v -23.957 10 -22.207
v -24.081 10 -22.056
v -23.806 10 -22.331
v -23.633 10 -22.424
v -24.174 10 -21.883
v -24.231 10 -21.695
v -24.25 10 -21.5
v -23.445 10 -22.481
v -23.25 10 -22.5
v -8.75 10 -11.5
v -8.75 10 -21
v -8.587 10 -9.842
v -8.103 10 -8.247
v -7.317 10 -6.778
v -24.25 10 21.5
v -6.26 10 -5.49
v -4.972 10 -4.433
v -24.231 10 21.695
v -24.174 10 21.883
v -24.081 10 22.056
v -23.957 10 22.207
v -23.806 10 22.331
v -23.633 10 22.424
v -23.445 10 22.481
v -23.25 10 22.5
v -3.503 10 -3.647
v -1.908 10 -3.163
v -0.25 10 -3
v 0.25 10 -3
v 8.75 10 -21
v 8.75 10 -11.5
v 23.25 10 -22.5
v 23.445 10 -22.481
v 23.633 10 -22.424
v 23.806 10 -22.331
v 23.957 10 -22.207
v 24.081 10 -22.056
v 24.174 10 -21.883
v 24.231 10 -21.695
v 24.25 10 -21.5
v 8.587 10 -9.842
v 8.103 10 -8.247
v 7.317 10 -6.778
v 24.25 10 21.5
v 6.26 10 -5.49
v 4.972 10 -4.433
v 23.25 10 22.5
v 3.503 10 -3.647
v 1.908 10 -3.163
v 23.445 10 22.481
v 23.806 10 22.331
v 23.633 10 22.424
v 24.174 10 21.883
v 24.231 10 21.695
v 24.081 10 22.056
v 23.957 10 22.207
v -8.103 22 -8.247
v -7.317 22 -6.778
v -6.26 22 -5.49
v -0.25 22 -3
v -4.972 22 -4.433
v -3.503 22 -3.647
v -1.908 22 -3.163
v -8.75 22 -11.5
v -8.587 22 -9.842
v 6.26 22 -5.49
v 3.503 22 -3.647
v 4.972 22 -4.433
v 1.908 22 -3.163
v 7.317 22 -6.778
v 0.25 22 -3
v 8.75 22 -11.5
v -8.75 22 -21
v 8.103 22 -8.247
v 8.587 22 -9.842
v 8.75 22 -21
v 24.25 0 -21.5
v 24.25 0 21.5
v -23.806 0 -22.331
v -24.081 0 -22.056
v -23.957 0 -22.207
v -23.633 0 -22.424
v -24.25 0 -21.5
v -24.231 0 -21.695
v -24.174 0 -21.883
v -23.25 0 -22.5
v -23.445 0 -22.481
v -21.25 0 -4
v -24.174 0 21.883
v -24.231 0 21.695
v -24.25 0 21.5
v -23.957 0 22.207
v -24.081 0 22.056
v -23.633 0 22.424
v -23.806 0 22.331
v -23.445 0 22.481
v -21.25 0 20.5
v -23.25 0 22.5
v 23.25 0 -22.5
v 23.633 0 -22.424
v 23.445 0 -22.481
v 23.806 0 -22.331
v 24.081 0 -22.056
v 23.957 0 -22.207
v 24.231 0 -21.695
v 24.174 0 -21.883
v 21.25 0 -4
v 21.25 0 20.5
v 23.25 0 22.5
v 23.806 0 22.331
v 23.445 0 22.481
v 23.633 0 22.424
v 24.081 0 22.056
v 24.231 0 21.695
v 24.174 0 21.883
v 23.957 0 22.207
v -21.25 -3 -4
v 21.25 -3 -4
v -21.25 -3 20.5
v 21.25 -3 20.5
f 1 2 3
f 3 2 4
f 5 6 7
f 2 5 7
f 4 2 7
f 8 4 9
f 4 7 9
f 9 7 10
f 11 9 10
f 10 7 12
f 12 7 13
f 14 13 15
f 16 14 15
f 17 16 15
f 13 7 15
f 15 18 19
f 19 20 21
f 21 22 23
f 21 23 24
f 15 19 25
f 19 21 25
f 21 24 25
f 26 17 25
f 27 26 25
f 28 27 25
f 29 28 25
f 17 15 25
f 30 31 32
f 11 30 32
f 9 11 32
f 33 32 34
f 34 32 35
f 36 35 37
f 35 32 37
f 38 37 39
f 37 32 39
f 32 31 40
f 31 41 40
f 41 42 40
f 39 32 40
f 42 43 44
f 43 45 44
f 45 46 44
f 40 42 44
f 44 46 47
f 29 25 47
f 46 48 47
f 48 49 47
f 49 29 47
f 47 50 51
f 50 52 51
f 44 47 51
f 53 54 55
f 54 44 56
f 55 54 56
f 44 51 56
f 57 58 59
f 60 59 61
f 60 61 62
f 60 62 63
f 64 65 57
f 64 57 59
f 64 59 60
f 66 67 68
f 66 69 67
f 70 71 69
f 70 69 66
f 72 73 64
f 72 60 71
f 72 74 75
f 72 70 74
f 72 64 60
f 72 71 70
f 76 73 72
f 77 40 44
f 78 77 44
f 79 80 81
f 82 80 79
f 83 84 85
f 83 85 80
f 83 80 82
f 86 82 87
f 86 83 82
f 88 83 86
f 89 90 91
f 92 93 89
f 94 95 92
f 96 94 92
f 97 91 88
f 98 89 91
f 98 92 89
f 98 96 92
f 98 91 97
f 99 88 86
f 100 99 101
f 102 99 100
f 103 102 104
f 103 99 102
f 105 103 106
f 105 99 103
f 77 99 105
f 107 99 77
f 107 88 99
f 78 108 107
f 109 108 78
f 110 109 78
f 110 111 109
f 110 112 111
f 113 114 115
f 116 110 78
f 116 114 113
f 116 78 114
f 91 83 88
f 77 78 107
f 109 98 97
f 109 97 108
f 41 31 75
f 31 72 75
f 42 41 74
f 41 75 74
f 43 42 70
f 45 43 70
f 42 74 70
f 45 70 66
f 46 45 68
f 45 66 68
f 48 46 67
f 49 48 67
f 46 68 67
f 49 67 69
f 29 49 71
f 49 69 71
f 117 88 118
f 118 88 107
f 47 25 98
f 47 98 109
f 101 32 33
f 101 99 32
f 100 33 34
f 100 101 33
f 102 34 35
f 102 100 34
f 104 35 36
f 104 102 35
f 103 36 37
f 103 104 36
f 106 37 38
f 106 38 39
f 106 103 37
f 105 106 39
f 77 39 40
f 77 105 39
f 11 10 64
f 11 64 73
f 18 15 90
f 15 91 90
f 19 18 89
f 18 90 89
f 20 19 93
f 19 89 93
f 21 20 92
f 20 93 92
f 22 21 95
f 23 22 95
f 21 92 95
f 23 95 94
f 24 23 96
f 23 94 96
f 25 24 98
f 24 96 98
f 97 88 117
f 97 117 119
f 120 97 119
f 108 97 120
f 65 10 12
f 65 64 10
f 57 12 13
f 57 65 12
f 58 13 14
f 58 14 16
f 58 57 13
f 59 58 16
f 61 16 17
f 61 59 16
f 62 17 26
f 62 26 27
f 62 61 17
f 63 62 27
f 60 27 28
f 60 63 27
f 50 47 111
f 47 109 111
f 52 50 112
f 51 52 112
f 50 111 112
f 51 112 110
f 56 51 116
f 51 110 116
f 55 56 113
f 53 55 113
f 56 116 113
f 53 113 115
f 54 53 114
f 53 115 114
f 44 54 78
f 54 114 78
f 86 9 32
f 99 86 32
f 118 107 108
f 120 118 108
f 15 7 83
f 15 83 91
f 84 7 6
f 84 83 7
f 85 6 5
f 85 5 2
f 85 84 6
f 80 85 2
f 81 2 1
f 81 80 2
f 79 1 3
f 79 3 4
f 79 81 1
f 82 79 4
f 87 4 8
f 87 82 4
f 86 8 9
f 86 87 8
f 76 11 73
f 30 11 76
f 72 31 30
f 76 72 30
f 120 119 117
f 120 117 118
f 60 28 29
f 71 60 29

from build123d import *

# Parameters (mm, degrees)
SKETCH002_W  = 48.5
SKETCH002_H  = 45
PAD_DEPTH    = 10
SKETCH003_W  = 42.5
SKETCH003_H  = 24.5
PAD002_DEPTH = 3
SKETCH004_W  = 17.5
SKETCH004_H  = 18
PAD003_DEPTH = 12
FILLET_R     = 1
FILLET001_R  = 8.5


with BuildPart() as part:
    # Sketch002 → Pad (new body)
    with BuildSketch(Plane.XZ):
        Rectangle(SKETCH002_W, SKETCH002_H)
    extrude(amount=PAD_DEPTH)

    # Sketch003 (on Face6 of Pad) → Pad002 (join)
    with BuildSketch(Plane.XZ.offset(10)):
        with Locations((0, 8.25)):
            Rectangle(SKETCH003_W, SKETCH003_H)
    extrude(amount=PAD002_DEPTH)

    # Sketch004 (on Face4 of Pad002) → Pad003 (join)
    with BuildSketch(Plane(origin=(0, 0, 0), x_dir=(1, 0, 0), z_dir=(0, 1, 0))):
        with Locations((0, 12)):
            Rectangle(SKETCH004_W, SKETCH004_H)
    extrude(amount=PAD003_DEPTH)

    # Fillet
    fillet_edges = [part.edges().sort_by_distance(p)[0] for p in [
        (24.25, -5, 22.5),
        (24.25, -5, -22.5),
        (-24.25, -5, 22.5),
        (-24.25, -5, -22.5),
    ]]
    fillet(fillet_edges, radius=FILLET_R)

    # Fillet001
    fillet001_edges = [part.edges().sort_by_distance(p)[0] for p in [
        (8.75, 6, -3),
        (-8.75, 6, -3),
    ]]
    fillet(fillet001_edges, radius=FILLET001_R)


with BuildPart() as part_1:
    # Body placement: moved
    add(part.part.moved(Location((0, 10, 0))))


solid = part_1.part
